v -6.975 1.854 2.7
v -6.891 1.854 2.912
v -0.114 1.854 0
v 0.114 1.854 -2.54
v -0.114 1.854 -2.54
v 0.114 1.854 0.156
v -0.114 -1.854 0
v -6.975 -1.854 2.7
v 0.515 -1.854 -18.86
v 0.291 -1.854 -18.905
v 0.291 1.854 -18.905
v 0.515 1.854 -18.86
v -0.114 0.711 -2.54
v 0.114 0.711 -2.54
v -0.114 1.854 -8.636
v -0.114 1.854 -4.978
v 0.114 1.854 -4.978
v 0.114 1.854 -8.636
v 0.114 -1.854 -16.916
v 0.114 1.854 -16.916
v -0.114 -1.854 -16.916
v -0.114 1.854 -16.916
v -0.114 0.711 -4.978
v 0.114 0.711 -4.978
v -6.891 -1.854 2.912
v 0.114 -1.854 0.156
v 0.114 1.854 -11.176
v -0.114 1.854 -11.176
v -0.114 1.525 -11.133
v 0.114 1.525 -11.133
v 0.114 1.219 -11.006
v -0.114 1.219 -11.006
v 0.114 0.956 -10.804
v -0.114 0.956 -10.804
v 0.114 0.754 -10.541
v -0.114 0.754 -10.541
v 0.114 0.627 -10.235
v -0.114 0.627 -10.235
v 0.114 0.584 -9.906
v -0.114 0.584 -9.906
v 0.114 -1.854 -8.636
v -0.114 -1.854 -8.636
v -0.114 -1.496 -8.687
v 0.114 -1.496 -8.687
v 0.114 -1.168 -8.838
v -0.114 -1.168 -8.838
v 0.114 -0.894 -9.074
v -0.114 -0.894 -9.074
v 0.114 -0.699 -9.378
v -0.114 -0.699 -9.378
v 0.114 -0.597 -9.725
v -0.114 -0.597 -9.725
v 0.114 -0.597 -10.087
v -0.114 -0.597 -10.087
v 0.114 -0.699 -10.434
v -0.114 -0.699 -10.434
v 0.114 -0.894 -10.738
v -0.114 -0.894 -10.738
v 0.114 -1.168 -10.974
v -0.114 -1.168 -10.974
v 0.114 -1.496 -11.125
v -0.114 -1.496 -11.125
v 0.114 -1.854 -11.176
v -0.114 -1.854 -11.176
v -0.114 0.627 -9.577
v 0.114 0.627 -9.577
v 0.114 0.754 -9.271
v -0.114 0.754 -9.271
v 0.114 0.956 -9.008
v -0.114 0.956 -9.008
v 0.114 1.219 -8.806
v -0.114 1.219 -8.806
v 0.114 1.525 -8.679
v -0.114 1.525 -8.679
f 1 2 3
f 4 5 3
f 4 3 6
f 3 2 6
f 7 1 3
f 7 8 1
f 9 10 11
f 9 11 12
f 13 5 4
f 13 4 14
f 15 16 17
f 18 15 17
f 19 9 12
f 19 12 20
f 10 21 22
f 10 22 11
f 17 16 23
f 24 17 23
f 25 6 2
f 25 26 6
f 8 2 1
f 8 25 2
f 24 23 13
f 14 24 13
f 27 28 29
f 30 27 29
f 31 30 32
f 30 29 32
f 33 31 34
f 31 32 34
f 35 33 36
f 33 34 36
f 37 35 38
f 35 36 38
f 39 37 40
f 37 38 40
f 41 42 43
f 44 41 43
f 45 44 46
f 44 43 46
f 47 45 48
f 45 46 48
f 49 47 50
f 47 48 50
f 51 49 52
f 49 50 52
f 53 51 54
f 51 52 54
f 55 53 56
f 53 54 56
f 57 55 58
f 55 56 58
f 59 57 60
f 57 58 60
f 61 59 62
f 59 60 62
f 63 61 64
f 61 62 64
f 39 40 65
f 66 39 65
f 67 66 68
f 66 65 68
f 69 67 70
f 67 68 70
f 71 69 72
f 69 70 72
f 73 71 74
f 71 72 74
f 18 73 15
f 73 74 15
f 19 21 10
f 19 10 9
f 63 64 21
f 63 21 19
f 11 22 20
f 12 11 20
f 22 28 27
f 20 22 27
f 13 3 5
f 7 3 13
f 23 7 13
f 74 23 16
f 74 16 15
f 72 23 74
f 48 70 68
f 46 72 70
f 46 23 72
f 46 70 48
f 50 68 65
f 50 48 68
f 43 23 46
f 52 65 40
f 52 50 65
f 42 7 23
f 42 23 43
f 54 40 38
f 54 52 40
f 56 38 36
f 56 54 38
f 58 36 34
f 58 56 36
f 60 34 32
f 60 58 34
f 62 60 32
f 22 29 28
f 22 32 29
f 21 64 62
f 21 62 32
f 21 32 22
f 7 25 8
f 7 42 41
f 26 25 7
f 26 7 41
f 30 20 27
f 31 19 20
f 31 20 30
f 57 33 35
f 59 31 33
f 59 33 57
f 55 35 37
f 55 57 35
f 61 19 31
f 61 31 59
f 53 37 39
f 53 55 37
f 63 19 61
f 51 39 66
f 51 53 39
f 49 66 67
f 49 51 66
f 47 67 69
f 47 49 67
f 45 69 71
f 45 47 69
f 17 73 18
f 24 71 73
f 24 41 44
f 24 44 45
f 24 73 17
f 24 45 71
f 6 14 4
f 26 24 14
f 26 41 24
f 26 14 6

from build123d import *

# Parameters (mm, degrees)
F1_DEPTH = 1.8542
F2_W     = 1.143
F2_H     = 2.4384
F3_DEPTH = 25.4


with BuildPart() as f1:
    # F0 (on Front) → F1 (new body, symmetric)
    with BuildSketch(Plane.XZ):
        Polygon((-6.975146, 2.699733), (-0.1143, 0), (-0.1143, -16.9164), (0.290897, -18.905481), (0.514896, -18.85985), (0.1143, -16.9164), (0.1143, 0), (0.1143, 0.155708), (-6.89144, 2.912456), align=None)
    extrude(amount=F1_DEPTH, both=True)

    # F2 (on face) → F3 (cut)
    with BuildSketch(Plane(origin=(-0.1143, 0, 0), x_dir=(0, -1, 0), z_dir=(-1, 0, 0))):
        with BuildLine():
            Line((-1.8542, -11.176), (-1.8542, -8.636))
            ThreePointArc((-1.8542, -8.636), (-3.1242, -9.906), (-1.8542, -11.176))
        make_face()
        with BuildLine():
            ThreePointArc((-0.5842, -9.906), (-0.956174, -9.007974), (-1.8542, -8.636))
            Line((-1.8542, -8.636), (-1.8542, -11.176))
            ThreePointArc((-1.8542, -11.176), (-0.956174, -10.804026), (-0.5842, -9.906))
        make_face()
        with BuildLine():
            ThreePointArc((3.1242, -9.906), (2.752226, -9.007974), (1.8542, -8.636))
            Line((1.8542, -8.636), (1.8542, -11.176))
            ThreePointArc((1.8542, -11.176), (2.752226, -10.804026), (3.1242, -9.906))
        make_face()
        with BuildLine():
            Line((1.8542, -11.176), (1.8542, -8.636))
            ThreePointArc((1.8542, -8.636), (0.5842, -9.906), (1.8542, -11.176))
        make_face()
        with Locations((-1.2827, -3.7592)):
            Rectangle(F2_W, F2_H)
    extrude(amount=-F3_DEPTH, mode=Mode.SUBTRACT)


solid = f1.part
